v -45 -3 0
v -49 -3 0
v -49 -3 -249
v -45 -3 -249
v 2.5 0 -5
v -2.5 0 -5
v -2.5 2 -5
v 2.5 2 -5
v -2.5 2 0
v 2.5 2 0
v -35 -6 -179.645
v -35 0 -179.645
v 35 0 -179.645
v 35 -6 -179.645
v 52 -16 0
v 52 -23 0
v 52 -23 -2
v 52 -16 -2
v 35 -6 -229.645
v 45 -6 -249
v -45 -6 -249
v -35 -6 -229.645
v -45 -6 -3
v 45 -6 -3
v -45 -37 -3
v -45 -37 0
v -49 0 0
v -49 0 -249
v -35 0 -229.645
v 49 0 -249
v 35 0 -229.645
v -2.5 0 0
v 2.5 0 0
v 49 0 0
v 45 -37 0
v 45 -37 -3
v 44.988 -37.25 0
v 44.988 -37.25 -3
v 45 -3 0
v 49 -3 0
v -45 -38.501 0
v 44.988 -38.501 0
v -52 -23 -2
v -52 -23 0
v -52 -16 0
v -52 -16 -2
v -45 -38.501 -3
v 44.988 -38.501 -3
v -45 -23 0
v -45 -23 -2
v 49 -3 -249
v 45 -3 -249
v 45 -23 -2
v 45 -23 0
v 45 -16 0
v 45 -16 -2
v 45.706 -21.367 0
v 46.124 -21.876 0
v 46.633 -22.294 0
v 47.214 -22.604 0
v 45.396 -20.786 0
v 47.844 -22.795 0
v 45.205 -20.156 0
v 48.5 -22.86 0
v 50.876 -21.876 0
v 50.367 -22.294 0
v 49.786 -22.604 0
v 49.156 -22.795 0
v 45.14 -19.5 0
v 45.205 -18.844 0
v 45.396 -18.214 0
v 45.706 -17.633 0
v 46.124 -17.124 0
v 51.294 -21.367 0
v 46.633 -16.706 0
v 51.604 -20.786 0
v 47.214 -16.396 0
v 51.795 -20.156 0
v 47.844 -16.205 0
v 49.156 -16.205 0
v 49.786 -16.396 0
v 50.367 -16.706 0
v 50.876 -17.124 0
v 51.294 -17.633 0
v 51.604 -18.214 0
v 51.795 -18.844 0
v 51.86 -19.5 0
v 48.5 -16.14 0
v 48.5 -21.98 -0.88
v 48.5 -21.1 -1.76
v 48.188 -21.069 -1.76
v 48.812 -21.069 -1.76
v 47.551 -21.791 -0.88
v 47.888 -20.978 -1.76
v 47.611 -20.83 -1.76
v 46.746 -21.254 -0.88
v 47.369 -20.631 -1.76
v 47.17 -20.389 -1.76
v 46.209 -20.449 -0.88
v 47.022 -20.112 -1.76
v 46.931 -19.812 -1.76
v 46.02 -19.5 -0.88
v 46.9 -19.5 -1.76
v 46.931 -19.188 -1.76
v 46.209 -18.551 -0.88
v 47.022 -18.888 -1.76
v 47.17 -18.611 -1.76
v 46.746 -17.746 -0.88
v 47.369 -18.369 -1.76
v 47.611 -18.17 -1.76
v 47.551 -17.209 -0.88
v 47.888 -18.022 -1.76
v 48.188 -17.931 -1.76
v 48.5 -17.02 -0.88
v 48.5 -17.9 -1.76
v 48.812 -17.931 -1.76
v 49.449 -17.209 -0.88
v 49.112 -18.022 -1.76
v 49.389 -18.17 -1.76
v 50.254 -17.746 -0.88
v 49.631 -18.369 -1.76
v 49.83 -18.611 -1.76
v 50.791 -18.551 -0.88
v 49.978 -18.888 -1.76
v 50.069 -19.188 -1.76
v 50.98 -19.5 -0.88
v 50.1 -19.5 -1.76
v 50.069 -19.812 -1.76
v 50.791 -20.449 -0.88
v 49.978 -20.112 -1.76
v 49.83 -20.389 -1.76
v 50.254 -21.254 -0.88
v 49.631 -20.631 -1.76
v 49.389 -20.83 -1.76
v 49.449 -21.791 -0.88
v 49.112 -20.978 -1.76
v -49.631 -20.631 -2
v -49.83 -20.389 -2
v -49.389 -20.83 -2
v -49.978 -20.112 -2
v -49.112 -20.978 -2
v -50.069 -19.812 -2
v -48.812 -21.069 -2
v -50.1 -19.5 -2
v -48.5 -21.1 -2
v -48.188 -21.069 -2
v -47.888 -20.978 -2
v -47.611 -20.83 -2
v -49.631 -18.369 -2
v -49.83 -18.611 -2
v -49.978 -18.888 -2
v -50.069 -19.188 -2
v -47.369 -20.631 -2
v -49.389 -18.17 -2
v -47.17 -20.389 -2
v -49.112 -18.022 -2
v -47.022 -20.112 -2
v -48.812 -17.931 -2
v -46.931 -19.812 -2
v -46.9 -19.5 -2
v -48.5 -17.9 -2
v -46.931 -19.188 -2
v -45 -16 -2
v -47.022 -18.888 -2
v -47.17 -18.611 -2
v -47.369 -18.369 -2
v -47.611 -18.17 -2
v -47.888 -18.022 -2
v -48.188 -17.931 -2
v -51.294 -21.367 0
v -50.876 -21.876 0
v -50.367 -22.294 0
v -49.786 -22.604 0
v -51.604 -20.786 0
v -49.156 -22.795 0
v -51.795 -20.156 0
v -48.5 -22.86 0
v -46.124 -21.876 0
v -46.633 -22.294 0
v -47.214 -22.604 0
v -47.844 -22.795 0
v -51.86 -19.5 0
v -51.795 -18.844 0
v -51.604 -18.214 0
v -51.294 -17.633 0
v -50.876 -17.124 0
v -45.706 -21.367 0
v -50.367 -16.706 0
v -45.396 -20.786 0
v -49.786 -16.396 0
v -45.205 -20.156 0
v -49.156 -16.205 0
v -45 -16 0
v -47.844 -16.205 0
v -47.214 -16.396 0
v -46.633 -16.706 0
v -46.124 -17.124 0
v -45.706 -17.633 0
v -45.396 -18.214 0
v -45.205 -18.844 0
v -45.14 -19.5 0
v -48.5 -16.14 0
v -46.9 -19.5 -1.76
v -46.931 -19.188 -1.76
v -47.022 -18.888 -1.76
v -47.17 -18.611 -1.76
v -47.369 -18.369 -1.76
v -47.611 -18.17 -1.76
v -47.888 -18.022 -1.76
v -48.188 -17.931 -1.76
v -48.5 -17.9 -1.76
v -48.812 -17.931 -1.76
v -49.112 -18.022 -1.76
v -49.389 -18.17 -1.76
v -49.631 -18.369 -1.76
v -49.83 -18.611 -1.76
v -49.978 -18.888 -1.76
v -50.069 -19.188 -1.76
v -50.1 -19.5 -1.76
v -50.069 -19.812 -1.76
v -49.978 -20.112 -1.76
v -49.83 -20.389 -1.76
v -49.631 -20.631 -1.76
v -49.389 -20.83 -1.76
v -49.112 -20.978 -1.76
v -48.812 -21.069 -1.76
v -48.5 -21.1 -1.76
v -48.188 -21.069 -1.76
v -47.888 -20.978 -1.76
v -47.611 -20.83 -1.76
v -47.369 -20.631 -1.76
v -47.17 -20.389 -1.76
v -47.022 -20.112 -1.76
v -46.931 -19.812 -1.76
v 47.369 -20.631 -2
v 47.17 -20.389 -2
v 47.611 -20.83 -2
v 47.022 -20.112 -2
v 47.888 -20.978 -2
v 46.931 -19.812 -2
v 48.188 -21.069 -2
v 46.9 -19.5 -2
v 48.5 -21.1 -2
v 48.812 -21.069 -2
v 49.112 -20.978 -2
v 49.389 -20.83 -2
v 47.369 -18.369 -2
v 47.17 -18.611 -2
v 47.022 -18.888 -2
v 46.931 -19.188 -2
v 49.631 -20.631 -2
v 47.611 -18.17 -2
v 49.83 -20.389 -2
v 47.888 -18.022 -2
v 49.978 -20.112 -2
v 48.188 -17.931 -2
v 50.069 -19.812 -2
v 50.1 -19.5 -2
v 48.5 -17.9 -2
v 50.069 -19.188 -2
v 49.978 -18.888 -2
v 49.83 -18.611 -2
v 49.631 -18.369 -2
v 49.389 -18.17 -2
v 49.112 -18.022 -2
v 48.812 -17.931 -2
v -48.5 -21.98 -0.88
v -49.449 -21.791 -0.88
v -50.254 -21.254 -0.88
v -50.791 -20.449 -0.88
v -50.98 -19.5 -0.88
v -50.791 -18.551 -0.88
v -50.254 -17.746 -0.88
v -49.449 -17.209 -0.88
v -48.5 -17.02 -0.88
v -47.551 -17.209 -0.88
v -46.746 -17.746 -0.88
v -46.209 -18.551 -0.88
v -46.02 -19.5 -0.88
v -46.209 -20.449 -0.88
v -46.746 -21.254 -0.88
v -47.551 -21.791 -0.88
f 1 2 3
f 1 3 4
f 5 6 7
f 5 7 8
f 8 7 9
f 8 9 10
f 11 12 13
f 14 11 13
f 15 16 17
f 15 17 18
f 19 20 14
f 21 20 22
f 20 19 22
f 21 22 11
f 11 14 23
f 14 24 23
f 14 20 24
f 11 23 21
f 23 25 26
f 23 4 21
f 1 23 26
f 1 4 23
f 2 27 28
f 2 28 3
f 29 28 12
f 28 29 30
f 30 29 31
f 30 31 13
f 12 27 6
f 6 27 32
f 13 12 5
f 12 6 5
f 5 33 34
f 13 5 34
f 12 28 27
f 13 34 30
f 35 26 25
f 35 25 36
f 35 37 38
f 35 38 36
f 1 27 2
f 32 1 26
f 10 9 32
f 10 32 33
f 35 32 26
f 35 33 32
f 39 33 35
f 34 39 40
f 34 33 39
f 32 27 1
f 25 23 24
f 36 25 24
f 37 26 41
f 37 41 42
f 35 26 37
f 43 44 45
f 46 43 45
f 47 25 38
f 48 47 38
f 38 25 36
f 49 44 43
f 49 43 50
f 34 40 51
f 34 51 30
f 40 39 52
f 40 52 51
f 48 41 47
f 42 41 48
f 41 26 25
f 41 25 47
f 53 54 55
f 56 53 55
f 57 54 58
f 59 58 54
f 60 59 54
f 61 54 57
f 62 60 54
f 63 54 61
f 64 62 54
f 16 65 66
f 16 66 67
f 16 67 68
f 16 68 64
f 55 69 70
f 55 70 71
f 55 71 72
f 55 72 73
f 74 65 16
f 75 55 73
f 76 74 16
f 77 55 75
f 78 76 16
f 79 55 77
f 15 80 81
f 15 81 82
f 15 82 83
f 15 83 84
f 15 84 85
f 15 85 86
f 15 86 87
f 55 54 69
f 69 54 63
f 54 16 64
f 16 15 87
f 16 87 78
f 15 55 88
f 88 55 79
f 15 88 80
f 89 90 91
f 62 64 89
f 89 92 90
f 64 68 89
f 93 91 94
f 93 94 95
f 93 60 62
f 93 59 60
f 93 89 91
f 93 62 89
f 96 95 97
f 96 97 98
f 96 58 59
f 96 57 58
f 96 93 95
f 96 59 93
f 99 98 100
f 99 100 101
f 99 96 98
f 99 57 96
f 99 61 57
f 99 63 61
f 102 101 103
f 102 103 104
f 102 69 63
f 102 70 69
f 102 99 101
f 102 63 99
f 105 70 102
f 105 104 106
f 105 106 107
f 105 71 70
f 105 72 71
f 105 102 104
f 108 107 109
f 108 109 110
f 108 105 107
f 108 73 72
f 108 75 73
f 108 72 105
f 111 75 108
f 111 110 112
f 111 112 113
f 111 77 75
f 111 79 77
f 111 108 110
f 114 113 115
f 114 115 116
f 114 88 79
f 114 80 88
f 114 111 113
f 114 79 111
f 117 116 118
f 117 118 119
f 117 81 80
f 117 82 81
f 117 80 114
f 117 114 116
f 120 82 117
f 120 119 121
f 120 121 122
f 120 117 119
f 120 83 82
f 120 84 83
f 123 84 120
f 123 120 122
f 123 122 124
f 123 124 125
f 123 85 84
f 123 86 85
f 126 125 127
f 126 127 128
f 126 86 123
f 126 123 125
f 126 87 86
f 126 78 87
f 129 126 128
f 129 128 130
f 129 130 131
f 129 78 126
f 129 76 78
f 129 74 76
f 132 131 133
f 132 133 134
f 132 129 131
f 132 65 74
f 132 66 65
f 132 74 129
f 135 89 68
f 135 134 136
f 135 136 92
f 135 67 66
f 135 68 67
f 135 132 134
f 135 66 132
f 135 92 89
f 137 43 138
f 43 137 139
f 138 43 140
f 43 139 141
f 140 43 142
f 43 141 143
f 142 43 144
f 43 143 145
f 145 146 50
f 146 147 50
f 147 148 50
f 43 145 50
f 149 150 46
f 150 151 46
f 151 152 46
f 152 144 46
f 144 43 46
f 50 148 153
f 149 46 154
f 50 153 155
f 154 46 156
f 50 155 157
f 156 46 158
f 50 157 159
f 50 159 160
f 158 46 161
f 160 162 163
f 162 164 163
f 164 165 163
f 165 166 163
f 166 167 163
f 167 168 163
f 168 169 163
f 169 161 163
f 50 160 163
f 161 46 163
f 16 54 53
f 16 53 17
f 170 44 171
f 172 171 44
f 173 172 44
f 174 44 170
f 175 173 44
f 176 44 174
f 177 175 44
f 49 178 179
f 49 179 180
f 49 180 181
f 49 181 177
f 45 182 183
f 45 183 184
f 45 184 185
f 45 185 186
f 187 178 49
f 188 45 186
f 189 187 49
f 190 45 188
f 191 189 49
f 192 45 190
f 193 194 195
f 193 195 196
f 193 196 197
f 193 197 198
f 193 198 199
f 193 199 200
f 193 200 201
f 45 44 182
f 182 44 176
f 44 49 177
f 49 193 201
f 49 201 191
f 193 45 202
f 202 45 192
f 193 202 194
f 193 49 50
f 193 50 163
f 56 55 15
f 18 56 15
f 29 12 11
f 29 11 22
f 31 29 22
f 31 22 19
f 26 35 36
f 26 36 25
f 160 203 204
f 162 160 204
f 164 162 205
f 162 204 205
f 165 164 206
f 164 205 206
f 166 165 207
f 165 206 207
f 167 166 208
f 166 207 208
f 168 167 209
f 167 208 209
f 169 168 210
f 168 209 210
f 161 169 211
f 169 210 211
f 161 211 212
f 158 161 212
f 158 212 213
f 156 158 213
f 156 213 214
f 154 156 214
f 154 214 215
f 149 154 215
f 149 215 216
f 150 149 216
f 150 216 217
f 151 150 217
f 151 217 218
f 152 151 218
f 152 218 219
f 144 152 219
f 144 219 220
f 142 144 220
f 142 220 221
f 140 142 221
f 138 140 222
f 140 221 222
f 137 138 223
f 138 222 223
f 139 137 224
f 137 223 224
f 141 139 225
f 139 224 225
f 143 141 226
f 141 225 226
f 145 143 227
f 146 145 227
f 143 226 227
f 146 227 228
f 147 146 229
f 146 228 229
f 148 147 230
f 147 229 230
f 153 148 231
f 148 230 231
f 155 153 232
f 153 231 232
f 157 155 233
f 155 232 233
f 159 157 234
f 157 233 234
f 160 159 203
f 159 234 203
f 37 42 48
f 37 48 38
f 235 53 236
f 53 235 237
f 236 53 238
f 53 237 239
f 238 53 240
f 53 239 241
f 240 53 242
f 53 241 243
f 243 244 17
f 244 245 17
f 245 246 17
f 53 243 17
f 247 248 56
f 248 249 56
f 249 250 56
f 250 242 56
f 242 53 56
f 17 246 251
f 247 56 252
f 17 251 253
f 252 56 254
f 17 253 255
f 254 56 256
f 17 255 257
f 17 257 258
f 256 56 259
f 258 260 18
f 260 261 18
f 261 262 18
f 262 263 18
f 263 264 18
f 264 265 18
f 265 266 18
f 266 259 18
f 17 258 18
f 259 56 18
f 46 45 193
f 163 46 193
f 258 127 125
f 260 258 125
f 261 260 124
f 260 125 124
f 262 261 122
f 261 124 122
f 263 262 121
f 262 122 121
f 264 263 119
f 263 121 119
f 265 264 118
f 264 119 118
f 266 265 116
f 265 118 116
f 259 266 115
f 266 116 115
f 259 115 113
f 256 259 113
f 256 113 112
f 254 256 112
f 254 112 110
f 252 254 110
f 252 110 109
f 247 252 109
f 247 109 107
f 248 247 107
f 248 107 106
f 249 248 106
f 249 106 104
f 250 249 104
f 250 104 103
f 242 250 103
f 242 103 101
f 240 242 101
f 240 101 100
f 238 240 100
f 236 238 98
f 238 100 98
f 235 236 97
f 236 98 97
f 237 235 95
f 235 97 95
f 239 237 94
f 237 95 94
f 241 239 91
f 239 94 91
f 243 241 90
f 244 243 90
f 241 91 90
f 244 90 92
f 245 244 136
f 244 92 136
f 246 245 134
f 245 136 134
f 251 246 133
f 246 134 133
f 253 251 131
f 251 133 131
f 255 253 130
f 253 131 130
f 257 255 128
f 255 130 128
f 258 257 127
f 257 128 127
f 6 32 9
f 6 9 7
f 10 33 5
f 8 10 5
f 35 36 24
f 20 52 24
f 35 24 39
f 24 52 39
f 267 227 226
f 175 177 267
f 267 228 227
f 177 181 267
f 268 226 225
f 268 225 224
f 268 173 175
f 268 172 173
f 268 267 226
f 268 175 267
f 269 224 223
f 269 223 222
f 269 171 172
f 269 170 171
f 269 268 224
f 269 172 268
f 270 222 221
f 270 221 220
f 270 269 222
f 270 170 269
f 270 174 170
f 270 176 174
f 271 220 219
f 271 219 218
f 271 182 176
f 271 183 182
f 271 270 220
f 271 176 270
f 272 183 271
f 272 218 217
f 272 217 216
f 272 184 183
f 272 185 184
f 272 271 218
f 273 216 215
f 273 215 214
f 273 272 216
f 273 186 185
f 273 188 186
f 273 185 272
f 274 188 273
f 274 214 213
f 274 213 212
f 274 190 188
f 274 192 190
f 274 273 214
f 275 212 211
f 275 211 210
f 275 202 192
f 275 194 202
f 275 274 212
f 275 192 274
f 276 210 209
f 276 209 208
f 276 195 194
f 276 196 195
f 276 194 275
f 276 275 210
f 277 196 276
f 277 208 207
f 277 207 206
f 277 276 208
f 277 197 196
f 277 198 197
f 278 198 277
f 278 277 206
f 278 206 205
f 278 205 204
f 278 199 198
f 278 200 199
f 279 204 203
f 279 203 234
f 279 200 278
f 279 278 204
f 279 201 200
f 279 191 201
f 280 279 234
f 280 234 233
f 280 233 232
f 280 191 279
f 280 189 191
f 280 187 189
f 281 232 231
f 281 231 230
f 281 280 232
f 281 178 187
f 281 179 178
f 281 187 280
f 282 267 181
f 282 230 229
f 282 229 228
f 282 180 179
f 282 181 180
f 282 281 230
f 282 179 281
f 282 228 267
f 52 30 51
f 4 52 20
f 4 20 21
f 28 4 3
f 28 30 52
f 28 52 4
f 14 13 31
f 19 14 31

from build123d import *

# Parameters (mm, degrees)
BOSS_EXTRUDE1_DEPTH                          = 249
SKETCH4_W                                    = 90
SKETCH4_H                                    = 3
BOSS_EXTRUDE2_DEPTH                          = 31
SKETCH5_W                                    = 70
SKETCH5_H                                    = 50
CUT_EXTRUDE1_DEPTH                           = 7
SKETCH6_W                                    = 7
SKETCH6_H                                    = 7
SKETCH6_R                                    = 1.6
BOSS_EXTRUDE3_DEPTH                          = 2
BOSS_EXTRUDE3_2_DEPTH                        = 2
BOSS_EXTRUDE4_DEPTH                          = 3
SKETCH8_W                                    = 5
SKETCH8_H                                    = 5
BOSS_EXTRUDE5_DEPTH                          = 2
CUT_EXTRUDE2_DEPTH                           = 250
CSK_FOR_M3_HEX_SOCKET_COUNTERSUNK_CA_2_COUNT = 2
CSK_FOR_M3_HEX_SOCKET_COUNTERSUNK_CA_2_PITCH = 97


with BuildPart() as part:
    # Sketch2 → Boss-Extrude1 (new body)
    with BuildSketch(Plane.XY):
        Polygon((-50, 0), (50, 0), (50, -4), (45, -4), (45, -6), (-45, -6), (-45, -4), (-50, -4), align=None)
    extrude(amount=-BOSS_EXTRUDE1_DEPTH)

    # Sketch4 → Boss-Extrude2 (add)
    with BuildSketch(Plane.XZ.offset(6)):
        with Locations((0, -1.5)):
            Rectangle(SKETCH4_W, SKETCH4_H)
    extrude(amount=BOSS_EXTRUDE2_DEPTH)

    # Sketch5 → Cut-Extrude1 (cut)
    with BuildSketch(Plane(origin=(0, 0, 0), x_dir=(1, 0, 0), z_dir=(0, 1, 0))):
        with Locations((0, 204.645453138)):
            Rectangle(SKETCH5_W, SKETCH5_H)
    extrude(amount=-CUT_EXTRUDE1_DEPTH, mode=Mode.SUBTRACT)

    # Sketch8 → Boss-Extrude5 (add)
    with BuildSketch(Plane(origin=(0, 0, 0), x_dir=(1, 0, 0), z_dir=(0, 1, 0))):
        with Locations((0, 2.5)):
            Rectangle(SKETCH8_W, SKETCH8_H)
    extrude(amount=BOSS_EXTRUDE5_DEPTH)

    # Sketch9 → Cut-Extrude2 (cut, through all)
    with BuildSketch(Plane.XY):
        Polygon((-49, 0), (-49, -3), (-45, -3), (-45, -4), (-50, -4), (-50, 0), align=None)
        Polygon((49, 0), (50, 0), (50, -4), (45, -4), (45, -3), (49, -3), align=None)
    extrude(amount=-CUT_EXTRUDE2_DEPTH, mode=Mode.SUBTRACT)


with BuildPart() as body_2:
    # Sketch6 → Boss-Extrude3 (new body)
    with BuildSketch(Plane.XY):
        with Locations((-48.5, -19.5)):
            Rectangle(SKETCH6_W, SKETCH6_H)
        with Locations((-48.5, -19.5)):
            Circle(SKETCH6_R, mode=Mode.SUBTRACT)
    extrude(amount=-BOSS_EXTRUDE3_DEPTH)

    # Sketch13 → CSK for M3 Hex Socket Countersunk Cap Screw1 (revolve, cut)
    with BuildSketch(Plane(origin=(-48.5, -19.5, 0), x_dir=(0, -1, 0), z_dir=(1, 0, 0))):
        Polygon((0, 0), (0, 6.2), (1.6, 5.23862301), (1.6, 1.76), (3.36, 0), align=None)
    csk_for_m3_hex_socket_countersunk_cap_sc = revolve(axis=Axis((-48.5, -19.5, 6.35), (0, 0, -1)), mode=Mode.SUBTRACT)


with BuildPart() as body_3:
    # Sketch6 → Boss-Extrude3 2 (new body)
    with BuildSketch(Plane.XY):
        with Locations((48.5, -19.5)):
            Rectangle(SKETCH6_W, SKETCH6_H)
        with Locations((48.5, -19.5)):
            Circle(SKETCH6_R, mode=Mode.SUBTRACT)
    extrude(amount=-BOSS_EXTRUDE3_2_DEPTH)

    # CSK for M3 Hex Socket Countersunk Ca 2: CSK for M3 Hex Socket Countersunk Cap Screw1 ×2
    with Locations(*[(i * CSK_FOR_M3_HEX_SOCKET_COUNTERSUNK_CA_2_PITCH, 0, 0) for i in range(1, CSK_FOR_M3_HEX_SOCKET_COUNTERSUNK_CA_2_COUNT)]):
        add(csk_for_m3_hex_socket_countersunk_cap_sc, mode=Mode.SUBTRACT)


with BuildPart() as body_4:
    # Sketch7 → Boss-Extrude4 (new body)
    with BuildSketch(Plane.XY):
        Polygon((-45, -37), (-45, -38.500868281), (44.987948755, -38.500868281), (44.987948755, -37.250413364), (45, -37), align=None)
    extrude(amount=-BOSS_EXTRUDE4_DEPTH)


solid = Compound([part.part, body_2.part, body_3.part, body_4.part])
